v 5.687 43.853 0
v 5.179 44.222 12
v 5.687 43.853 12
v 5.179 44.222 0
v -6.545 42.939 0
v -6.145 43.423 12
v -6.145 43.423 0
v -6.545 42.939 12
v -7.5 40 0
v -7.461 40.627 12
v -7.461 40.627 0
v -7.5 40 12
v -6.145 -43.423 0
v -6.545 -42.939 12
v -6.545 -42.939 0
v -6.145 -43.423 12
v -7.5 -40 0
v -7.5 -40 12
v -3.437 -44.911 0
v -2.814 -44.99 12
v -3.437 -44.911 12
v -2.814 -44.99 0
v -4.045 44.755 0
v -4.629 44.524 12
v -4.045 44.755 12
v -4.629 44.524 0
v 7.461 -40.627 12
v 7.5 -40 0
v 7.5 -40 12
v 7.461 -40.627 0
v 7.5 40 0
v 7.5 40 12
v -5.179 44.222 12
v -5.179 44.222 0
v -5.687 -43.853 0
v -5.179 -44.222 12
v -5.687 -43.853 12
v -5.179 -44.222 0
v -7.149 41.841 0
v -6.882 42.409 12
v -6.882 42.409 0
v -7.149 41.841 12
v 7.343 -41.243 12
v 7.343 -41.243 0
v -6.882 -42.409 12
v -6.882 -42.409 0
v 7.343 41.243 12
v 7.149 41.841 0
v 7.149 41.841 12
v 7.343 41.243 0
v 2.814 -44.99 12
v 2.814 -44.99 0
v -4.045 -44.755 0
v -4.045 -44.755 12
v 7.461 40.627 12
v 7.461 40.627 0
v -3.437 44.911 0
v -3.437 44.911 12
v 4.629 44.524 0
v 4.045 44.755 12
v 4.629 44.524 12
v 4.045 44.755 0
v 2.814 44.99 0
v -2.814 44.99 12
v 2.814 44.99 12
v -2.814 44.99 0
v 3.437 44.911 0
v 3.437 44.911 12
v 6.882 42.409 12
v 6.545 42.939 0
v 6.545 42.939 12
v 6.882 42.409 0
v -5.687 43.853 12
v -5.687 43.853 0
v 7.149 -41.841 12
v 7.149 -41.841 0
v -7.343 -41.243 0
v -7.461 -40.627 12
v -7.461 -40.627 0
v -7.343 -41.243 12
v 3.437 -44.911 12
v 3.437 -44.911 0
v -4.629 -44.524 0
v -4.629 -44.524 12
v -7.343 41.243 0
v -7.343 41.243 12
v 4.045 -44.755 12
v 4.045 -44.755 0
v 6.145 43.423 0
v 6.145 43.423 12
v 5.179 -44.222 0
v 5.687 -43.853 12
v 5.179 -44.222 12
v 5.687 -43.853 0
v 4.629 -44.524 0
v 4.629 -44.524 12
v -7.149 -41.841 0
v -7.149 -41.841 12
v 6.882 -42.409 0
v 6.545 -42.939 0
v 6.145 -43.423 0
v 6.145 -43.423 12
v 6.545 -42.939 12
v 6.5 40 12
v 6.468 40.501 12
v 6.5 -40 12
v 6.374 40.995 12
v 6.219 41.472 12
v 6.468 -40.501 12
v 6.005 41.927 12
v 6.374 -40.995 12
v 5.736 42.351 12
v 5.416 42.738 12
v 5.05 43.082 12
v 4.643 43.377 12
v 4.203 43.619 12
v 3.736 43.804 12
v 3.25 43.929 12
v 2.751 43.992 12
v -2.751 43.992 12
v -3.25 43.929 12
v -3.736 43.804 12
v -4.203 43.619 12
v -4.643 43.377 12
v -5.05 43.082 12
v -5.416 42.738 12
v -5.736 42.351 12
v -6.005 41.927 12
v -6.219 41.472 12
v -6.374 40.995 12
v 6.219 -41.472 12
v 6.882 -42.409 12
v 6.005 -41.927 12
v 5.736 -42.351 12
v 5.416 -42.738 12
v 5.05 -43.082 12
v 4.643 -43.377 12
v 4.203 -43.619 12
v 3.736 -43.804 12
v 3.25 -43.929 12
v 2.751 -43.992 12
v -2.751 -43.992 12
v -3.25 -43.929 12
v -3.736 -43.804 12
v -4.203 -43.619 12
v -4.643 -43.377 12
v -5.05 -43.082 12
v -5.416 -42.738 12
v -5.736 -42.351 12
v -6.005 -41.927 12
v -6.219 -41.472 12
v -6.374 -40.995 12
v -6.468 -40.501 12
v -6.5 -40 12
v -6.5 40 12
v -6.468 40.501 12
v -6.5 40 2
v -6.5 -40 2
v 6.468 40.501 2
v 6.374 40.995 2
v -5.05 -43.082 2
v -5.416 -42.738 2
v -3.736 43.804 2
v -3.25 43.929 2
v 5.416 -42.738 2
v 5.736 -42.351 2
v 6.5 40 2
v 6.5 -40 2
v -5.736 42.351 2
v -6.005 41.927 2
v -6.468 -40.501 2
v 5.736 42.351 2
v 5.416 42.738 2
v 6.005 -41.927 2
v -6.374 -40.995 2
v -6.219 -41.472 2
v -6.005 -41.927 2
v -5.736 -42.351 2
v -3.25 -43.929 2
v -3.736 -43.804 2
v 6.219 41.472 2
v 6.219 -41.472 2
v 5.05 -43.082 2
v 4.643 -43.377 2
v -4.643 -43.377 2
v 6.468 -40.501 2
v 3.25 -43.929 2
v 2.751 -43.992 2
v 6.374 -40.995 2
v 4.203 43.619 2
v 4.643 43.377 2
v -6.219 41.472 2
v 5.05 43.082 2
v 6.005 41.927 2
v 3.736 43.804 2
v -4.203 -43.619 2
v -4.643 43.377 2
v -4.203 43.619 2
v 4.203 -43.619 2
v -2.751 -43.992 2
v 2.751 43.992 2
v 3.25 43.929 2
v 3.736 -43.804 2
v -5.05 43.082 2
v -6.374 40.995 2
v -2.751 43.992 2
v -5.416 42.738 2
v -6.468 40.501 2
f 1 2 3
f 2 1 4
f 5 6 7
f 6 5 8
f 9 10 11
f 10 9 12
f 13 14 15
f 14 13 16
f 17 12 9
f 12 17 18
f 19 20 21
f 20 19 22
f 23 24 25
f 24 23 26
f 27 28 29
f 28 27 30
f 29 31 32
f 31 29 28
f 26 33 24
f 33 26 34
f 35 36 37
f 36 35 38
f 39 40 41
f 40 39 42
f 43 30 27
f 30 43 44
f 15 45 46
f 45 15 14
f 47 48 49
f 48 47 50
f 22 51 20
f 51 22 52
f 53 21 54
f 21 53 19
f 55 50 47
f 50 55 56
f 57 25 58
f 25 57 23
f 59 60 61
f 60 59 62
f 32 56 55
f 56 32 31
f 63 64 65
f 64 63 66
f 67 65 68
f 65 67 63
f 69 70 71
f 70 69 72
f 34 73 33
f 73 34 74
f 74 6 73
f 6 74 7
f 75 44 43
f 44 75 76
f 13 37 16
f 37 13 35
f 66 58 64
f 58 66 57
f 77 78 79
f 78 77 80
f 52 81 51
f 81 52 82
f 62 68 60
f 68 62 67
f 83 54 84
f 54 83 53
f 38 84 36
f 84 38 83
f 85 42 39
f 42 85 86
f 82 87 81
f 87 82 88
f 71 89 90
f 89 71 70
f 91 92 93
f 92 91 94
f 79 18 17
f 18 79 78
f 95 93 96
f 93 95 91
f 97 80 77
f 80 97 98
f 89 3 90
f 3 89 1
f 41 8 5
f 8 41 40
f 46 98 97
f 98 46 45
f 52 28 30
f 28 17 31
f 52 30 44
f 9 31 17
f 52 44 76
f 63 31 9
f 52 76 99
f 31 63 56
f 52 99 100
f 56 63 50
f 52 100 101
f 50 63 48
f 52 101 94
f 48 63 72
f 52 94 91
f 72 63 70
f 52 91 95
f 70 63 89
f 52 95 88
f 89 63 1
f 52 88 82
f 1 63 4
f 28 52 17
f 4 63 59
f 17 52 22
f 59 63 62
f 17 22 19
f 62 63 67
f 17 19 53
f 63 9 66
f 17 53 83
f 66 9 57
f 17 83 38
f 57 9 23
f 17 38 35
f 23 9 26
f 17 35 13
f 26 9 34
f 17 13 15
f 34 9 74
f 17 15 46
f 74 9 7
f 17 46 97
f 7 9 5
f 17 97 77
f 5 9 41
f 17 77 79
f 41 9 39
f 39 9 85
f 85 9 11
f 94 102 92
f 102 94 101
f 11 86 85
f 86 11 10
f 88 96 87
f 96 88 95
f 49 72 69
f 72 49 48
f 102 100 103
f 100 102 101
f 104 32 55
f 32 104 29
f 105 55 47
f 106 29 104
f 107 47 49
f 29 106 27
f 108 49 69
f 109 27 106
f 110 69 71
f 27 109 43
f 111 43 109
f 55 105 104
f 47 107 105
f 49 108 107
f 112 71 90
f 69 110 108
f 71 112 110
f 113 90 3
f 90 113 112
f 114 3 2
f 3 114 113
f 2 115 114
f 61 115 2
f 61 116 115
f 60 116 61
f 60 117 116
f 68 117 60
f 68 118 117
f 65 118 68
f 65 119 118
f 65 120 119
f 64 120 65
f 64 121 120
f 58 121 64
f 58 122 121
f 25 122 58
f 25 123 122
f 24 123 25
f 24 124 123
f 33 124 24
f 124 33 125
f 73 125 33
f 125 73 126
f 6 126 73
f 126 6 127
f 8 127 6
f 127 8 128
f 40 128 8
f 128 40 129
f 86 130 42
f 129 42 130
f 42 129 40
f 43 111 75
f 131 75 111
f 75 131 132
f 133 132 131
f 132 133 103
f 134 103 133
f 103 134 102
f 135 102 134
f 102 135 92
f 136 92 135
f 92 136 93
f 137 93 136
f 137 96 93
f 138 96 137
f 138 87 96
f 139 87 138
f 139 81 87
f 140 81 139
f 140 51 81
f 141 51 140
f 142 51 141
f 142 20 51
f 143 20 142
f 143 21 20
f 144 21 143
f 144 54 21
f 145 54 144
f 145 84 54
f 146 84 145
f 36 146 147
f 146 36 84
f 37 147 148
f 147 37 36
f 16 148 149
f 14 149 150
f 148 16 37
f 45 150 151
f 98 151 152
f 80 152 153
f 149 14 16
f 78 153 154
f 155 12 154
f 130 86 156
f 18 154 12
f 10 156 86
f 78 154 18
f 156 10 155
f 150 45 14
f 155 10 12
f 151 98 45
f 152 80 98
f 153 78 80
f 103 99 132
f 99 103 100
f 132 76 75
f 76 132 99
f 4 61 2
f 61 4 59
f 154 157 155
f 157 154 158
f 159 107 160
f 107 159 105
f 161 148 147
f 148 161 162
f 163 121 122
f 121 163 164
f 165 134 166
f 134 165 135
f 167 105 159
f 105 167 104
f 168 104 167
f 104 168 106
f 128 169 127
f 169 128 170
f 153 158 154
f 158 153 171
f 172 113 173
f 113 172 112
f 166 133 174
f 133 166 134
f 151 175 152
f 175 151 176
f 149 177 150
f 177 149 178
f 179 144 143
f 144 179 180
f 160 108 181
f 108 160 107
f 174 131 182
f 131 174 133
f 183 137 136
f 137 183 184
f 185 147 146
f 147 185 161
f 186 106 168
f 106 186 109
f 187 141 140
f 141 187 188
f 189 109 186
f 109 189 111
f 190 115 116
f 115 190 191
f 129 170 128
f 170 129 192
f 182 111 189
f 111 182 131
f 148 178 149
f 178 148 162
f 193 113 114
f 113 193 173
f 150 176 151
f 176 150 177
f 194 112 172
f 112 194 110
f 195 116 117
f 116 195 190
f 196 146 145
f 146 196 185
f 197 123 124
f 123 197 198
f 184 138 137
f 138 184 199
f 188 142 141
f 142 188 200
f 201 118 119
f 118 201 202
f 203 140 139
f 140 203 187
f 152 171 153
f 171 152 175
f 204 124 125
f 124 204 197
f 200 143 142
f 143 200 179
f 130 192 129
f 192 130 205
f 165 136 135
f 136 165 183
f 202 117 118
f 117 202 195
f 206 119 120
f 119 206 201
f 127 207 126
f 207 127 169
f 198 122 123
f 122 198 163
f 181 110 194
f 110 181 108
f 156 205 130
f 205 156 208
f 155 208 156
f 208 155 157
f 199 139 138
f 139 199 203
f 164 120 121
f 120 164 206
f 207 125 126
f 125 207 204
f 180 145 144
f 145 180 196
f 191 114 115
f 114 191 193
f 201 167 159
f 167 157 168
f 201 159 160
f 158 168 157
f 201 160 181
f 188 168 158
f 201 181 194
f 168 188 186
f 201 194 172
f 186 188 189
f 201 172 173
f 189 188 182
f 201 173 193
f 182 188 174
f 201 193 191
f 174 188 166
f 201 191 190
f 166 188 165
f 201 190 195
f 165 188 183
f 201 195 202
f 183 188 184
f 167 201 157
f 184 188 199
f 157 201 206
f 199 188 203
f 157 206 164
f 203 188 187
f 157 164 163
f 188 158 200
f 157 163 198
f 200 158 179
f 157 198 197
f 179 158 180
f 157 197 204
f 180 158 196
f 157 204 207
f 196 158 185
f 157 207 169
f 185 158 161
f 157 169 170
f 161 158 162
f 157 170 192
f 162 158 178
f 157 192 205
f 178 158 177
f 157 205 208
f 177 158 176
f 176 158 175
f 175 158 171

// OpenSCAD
$fn = 50;


difference() {
	union() {
		hull() {
			translate(v = [-2.5000000000, 40.0000000000, 0]) {
				cylinder(h = 12, r = 5);
			}
			translate(v = [2.5000000000, 40.0000000000, 0]) {
				cylinder(h = 12, r = 5);
			}
			translate(v = [-2.5000000000, -40.0000000000, 0]) {
				cylinder(h = 12, r = 5);
			}
			translate(v = [2.5000000000, -40.0000000000, 0]) {
				cylinder(h = 12, r = 5);
			}
		}
	}
	union() {
		translate(v = [0, 0, 2]) {
			hull() {
				translate(v = [-2.5000000000, 40.0000000000, 0]) {
					cylinder(h = 10, r = 4);
				}
				translate(v = [2.5000000000, 40.0000000000, 0]) {
					cylinder(h = 10, r = 4);
				}
				translate(v = [-2.5000000000, -40.0000000000, 0]) {
					cylinder(h = 10, r = 4);
				}
				translate(v = [2.5000000000, -40.0000000000, 0]) {
					cylinder(h = 10, r = 4);
				}
			}
		}
	}
}
